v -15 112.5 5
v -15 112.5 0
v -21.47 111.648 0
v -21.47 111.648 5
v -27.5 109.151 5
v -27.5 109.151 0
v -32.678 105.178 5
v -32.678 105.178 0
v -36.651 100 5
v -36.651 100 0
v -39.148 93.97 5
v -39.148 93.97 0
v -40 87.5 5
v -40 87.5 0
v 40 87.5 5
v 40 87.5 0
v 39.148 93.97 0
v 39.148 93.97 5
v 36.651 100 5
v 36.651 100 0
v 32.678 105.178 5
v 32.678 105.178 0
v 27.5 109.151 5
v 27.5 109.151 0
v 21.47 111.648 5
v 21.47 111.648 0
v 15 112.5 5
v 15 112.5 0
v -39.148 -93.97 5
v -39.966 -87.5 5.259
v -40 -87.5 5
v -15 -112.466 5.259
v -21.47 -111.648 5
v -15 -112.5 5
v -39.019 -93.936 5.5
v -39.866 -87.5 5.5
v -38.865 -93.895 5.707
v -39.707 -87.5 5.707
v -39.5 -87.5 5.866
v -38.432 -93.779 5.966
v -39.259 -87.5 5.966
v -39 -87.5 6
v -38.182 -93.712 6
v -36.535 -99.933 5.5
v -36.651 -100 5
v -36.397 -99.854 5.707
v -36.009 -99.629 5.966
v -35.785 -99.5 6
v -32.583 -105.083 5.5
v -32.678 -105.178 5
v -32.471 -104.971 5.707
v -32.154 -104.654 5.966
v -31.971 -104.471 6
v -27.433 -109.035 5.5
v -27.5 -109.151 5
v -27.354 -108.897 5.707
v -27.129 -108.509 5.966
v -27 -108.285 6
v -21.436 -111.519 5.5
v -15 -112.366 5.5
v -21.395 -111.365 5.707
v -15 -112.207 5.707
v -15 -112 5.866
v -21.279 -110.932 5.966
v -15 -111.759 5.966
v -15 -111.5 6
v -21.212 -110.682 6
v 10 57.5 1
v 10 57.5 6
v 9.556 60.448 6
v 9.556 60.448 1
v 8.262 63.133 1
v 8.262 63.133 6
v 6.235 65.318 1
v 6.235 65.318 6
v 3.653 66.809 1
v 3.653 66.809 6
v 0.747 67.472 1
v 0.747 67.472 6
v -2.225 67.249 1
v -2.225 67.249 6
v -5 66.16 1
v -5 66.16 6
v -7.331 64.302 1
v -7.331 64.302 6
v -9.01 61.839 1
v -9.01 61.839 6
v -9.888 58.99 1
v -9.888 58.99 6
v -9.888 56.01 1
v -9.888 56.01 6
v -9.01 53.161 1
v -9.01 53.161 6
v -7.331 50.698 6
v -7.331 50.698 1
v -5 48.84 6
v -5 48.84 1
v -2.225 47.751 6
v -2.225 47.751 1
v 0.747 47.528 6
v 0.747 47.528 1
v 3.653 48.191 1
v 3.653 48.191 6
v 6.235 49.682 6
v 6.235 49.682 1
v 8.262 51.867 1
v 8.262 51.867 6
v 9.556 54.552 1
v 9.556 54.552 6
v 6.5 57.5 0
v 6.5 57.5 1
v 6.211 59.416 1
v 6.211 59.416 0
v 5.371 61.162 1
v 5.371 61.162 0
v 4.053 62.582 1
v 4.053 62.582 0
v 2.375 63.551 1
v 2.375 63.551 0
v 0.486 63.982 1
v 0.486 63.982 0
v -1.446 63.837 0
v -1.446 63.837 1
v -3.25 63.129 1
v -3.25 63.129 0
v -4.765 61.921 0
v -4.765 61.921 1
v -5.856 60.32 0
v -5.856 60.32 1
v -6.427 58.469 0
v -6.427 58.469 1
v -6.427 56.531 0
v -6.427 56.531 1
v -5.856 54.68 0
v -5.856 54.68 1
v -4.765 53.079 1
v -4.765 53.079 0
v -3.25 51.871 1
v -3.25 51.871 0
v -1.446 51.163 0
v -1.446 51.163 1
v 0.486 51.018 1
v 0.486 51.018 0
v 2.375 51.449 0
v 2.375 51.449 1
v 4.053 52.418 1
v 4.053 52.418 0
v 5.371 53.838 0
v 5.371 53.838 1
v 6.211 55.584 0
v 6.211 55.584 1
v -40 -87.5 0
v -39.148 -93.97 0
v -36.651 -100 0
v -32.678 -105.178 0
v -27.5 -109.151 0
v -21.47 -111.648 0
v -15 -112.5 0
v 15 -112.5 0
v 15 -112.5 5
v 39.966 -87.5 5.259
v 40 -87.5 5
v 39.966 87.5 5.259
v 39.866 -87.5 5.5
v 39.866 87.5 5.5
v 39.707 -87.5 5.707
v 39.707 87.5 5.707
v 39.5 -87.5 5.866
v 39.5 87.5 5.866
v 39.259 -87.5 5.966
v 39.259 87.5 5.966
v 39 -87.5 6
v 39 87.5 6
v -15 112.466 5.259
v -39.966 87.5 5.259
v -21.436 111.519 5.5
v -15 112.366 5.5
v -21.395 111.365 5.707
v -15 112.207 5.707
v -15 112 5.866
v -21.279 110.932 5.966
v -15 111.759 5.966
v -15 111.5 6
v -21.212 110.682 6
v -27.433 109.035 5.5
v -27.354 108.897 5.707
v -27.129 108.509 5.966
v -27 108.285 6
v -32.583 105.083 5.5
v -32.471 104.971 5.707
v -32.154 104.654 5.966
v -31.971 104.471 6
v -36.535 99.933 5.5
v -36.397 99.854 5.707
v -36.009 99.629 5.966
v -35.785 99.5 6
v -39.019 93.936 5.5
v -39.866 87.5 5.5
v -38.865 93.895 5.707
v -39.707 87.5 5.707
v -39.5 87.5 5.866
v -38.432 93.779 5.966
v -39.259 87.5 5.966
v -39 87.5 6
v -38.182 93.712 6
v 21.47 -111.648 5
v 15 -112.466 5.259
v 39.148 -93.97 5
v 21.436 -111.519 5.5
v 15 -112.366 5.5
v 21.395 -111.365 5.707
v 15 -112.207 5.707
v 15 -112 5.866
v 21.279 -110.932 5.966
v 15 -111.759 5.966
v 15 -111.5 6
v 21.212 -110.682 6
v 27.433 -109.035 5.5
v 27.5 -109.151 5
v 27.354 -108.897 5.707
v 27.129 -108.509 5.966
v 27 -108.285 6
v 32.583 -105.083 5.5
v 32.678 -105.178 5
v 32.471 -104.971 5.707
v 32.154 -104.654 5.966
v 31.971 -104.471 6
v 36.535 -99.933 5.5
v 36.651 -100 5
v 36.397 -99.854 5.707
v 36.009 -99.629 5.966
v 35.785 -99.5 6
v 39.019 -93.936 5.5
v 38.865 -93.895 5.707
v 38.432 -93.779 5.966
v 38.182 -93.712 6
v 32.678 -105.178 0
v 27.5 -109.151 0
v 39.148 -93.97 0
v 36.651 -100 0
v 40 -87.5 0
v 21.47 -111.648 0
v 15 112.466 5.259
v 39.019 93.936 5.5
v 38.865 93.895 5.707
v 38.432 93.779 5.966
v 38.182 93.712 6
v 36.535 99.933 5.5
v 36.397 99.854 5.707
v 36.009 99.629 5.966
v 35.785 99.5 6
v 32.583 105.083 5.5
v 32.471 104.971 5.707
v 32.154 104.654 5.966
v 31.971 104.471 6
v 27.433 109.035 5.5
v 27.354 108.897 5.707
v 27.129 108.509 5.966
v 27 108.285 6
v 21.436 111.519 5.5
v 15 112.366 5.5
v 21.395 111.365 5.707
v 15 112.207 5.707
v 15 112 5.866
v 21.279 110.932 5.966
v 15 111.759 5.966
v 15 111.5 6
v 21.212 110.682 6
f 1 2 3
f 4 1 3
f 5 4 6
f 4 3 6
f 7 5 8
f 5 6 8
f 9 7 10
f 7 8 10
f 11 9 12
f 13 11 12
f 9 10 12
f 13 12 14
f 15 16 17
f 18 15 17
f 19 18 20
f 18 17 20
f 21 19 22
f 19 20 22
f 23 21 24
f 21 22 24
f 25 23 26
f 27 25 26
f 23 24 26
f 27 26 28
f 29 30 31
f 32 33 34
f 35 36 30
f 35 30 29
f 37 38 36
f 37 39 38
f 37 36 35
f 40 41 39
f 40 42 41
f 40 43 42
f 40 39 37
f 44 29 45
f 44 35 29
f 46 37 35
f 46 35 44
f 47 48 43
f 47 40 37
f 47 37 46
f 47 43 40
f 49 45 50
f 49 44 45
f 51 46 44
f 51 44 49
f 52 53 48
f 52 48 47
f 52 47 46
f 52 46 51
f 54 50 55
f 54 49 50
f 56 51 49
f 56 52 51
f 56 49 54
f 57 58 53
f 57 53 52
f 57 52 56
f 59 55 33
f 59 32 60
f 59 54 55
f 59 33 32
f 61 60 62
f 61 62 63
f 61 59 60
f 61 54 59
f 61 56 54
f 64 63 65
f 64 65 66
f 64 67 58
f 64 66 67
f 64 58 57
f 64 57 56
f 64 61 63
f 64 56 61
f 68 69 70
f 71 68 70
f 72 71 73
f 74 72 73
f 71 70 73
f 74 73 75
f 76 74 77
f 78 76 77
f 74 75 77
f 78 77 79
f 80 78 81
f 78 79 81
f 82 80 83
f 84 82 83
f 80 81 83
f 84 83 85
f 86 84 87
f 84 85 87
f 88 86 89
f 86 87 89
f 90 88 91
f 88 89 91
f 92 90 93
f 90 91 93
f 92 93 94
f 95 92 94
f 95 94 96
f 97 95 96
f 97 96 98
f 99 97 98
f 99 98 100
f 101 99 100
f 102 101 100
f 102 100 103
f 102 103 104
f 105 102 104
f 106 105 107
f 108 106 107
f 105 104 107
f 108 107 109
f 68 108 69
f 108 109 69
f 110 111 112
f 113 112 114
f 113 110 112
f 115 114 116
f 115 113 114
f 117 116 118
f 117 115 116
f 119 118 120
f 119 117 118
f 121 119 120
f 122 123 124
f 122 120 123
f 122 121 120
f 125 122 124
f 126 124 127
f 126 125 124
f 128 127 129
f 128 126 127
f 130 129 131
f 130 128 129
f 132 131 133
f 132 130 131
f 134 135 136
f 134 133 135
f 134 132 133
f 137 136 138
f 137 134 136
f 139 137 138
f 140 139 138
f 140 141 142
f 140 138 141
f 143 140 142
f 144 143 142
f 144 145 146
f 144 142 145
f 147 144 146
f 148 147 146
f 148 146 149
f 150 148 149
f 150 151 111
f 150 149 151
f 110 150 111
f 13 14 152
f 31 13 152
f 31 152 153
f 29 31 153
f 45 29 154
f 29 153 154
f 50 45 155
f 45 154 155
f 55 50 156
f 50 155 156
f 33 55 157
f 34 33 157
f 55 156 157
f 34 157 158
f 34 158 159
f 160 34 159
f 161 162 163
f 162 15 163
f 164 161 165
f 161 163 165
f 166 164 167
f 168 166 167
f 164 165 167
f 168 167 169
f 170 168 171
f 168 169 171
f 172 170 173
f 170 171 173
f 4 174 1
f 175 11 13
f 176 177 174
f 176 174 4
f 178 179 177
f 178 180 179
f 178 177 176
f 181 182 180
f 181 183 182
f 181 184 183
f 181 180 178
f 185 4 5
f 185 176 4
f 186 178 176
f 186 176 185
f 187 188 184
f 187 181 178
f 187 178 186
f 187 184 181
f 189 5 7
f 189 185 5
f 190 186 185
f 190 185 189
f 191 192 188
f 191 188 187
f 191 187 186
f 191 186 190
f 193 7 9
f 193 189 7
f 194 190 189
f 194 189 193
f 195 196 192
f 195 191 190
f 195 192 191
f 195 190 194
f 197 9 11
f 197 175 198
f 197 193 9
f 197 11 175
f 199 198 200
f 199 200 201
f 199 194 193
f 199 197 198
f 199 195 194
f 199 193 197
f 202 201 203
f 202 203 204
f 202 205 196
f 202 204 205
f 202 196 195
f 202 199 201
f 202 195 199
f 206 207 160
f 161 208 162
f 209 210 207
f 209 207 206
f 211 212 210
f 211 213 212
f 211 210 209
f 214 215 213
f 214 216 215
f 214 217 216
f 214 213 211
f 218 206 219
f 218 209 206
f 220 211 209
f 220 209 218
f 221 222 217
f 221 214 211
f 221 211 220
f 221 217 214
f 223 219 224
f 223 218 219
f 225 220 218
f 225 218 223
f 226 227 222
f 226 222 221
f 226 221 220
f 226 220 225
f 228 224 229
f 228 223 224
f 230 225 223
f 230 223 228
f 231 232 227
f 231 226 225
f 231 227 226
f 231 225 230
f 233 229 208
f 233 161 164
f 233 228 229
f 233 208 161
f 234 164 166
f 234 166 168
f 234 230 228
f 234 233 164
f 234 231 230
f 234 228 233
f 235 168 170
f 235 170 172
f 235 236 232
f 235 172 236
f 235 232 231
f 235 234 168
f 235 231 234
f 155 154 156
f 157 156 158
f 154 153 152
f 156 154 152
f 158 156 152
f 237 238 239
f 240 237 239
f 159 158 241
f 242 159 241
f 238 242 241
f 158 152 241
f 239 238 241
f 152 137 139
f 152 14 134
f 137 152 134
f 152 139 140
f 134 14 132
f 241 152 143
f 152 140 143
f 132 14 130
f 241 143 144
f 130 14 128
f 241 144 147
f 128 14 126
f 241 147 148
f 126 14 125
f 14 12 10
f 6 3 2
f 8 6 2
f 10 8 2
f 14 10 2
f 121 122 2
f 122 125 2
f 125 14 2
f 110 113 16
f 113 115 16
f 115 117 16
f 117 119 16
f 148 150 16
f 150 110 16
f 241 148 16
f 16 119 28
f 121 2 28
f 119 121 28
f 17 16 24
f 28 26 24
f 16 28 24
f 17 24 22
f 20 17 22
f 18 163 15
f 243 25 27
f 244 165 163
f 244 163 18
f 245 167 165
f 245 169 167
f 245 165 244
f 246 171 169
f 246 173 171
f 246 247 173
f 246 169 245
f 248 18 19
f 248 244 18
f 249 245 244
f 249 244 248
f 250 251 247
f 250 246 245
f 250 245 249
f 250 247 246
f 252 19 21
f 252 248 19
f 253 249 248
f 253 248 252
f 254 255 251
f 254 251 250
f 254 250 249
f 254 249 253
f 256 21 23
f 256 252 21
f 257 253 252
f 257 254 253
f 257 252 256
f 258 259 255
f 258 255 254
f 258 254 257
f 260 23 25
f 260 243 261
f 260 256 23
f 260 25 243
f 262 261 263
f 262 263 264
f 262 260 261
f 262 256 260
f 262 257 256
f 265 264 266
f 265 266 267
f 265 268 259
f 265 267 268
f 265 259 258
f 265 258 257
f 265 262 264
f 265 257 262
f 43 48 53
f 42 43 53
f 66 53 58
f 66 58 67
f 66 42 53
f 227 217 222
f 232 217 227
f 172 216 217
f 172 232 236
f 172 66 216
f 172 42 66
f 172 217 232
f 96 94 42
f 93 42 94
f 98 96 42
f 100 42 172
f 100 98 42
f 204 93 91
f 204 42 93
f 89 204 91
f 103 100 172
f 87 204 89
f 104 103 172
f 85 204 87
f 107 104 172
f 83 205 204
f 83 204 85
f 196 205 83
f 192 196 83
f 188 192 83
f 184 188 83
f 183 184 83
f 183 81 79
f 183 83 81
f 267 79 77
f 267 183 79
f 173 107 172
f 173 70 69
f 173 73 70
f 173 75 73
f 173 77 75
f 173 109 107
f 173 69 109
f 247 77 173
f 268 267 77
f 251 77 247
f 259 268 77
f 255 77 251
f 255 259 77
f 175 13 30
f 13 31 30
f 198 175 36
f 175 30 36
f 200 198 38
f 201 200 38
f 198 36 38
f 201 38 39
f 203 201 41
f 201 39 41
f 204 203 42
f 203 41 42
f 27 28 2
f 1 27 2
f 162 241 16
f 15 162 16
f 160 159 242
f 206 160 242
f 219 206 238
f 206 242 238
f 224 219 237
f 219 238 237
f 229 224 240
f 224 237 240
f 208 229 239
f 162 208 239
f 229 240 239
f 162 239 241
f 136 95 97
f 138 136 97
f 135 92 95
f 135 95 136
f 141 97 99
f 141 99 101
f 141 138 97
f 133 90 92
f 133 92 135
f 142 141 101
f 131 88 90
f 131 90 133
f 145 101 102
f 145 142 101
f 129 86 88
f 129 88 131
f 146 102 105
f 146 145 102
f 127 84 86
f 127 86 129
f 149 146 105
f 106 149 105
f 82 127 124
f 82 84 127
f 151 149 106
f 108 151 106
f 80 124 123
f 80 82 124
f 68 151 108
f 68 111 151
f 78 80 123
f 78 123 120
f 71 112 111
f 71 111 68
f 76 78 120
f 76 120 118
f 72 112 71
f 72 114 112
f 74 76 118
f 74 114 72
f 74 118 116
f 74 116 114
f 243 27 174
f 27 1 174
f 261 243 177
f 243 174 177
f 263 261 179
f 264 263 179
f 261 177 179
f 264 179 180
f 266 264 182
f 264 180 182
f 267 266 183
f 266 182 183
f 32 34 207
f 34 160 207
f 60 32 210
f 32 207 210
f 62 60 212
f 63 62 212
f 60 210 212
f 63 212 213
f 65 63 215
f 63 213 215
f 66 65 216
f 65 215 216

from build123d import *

# Parameters (mm, degrees)
SKETCH_1_R          = 6.5
EXTRUDE_1_DEPTH     = 6
FILLET_1_R          = 1
SKETCH_2_R          = 10
CUT_EXTRUDE_1_DEPTH = 5


with BuildPart() as part:
    # 草图1 → 凸台-拉伸1 (new body)
    with BuildSketch(Plane.XY):
        with BuildLine():
            Line((15, 112.5), (-15, 112.5))
            ThreePointArc((-15, 112.5), (-32.67766953, 105.17766953), (-40, 87.5))
            Line((-40, 87.5), (-40, -87.5))
            ThreePointArc((-40, -87.5), (-32.67766953, -105.17766953), (-15, -112.5))
            Line((-15, -112.5), (15, -112.5))
            ThreePointArc((15, -112.5), (32.67766953, -105.17766953), (40, -87.5))
            Line((40, -87.5), (40, 87.5))
            ThreePointArc((40, 87.5), (32.67766953, 105.17766953), (15, 112.5))
        make_face()
        with Locations((0, 57.5)):
            Circle(SKETCH_1_R, mode=Mode.SUBTRACT)
    extrude(amount=EXTRUDE_1_DEPTH)

    # 圆角1
    fillet_1_edges = [part.edges().sort_by_distance(p)[0] for p in [
        (32.67766953, -105.17766953, 6),
        (40, 0, 6),
        (32.67766953, 105.17766953, 6),
        (0, 112.5, 6),
        (-32.67766953, 105.17766953, 6),
        (-40, 0, 6),
        (-32.67766953, -105.17766953, 6),
        (0, -112.5, 6),
    ]]
    fillet(fillet_1_edges, radius=FILLET_1_R)

    # 草图2 → 切除-拉伸1 (cut)
    with BuildSketch(Plane.XY.offset(6)):
        with Locations((0, 57.5)):
            Circle(SKETCH_2_R)
    extrude(amount=-CUT_EXTRUDE_1_DEPTH, mode=Mode.SUBTRACT)


solid = part.part
